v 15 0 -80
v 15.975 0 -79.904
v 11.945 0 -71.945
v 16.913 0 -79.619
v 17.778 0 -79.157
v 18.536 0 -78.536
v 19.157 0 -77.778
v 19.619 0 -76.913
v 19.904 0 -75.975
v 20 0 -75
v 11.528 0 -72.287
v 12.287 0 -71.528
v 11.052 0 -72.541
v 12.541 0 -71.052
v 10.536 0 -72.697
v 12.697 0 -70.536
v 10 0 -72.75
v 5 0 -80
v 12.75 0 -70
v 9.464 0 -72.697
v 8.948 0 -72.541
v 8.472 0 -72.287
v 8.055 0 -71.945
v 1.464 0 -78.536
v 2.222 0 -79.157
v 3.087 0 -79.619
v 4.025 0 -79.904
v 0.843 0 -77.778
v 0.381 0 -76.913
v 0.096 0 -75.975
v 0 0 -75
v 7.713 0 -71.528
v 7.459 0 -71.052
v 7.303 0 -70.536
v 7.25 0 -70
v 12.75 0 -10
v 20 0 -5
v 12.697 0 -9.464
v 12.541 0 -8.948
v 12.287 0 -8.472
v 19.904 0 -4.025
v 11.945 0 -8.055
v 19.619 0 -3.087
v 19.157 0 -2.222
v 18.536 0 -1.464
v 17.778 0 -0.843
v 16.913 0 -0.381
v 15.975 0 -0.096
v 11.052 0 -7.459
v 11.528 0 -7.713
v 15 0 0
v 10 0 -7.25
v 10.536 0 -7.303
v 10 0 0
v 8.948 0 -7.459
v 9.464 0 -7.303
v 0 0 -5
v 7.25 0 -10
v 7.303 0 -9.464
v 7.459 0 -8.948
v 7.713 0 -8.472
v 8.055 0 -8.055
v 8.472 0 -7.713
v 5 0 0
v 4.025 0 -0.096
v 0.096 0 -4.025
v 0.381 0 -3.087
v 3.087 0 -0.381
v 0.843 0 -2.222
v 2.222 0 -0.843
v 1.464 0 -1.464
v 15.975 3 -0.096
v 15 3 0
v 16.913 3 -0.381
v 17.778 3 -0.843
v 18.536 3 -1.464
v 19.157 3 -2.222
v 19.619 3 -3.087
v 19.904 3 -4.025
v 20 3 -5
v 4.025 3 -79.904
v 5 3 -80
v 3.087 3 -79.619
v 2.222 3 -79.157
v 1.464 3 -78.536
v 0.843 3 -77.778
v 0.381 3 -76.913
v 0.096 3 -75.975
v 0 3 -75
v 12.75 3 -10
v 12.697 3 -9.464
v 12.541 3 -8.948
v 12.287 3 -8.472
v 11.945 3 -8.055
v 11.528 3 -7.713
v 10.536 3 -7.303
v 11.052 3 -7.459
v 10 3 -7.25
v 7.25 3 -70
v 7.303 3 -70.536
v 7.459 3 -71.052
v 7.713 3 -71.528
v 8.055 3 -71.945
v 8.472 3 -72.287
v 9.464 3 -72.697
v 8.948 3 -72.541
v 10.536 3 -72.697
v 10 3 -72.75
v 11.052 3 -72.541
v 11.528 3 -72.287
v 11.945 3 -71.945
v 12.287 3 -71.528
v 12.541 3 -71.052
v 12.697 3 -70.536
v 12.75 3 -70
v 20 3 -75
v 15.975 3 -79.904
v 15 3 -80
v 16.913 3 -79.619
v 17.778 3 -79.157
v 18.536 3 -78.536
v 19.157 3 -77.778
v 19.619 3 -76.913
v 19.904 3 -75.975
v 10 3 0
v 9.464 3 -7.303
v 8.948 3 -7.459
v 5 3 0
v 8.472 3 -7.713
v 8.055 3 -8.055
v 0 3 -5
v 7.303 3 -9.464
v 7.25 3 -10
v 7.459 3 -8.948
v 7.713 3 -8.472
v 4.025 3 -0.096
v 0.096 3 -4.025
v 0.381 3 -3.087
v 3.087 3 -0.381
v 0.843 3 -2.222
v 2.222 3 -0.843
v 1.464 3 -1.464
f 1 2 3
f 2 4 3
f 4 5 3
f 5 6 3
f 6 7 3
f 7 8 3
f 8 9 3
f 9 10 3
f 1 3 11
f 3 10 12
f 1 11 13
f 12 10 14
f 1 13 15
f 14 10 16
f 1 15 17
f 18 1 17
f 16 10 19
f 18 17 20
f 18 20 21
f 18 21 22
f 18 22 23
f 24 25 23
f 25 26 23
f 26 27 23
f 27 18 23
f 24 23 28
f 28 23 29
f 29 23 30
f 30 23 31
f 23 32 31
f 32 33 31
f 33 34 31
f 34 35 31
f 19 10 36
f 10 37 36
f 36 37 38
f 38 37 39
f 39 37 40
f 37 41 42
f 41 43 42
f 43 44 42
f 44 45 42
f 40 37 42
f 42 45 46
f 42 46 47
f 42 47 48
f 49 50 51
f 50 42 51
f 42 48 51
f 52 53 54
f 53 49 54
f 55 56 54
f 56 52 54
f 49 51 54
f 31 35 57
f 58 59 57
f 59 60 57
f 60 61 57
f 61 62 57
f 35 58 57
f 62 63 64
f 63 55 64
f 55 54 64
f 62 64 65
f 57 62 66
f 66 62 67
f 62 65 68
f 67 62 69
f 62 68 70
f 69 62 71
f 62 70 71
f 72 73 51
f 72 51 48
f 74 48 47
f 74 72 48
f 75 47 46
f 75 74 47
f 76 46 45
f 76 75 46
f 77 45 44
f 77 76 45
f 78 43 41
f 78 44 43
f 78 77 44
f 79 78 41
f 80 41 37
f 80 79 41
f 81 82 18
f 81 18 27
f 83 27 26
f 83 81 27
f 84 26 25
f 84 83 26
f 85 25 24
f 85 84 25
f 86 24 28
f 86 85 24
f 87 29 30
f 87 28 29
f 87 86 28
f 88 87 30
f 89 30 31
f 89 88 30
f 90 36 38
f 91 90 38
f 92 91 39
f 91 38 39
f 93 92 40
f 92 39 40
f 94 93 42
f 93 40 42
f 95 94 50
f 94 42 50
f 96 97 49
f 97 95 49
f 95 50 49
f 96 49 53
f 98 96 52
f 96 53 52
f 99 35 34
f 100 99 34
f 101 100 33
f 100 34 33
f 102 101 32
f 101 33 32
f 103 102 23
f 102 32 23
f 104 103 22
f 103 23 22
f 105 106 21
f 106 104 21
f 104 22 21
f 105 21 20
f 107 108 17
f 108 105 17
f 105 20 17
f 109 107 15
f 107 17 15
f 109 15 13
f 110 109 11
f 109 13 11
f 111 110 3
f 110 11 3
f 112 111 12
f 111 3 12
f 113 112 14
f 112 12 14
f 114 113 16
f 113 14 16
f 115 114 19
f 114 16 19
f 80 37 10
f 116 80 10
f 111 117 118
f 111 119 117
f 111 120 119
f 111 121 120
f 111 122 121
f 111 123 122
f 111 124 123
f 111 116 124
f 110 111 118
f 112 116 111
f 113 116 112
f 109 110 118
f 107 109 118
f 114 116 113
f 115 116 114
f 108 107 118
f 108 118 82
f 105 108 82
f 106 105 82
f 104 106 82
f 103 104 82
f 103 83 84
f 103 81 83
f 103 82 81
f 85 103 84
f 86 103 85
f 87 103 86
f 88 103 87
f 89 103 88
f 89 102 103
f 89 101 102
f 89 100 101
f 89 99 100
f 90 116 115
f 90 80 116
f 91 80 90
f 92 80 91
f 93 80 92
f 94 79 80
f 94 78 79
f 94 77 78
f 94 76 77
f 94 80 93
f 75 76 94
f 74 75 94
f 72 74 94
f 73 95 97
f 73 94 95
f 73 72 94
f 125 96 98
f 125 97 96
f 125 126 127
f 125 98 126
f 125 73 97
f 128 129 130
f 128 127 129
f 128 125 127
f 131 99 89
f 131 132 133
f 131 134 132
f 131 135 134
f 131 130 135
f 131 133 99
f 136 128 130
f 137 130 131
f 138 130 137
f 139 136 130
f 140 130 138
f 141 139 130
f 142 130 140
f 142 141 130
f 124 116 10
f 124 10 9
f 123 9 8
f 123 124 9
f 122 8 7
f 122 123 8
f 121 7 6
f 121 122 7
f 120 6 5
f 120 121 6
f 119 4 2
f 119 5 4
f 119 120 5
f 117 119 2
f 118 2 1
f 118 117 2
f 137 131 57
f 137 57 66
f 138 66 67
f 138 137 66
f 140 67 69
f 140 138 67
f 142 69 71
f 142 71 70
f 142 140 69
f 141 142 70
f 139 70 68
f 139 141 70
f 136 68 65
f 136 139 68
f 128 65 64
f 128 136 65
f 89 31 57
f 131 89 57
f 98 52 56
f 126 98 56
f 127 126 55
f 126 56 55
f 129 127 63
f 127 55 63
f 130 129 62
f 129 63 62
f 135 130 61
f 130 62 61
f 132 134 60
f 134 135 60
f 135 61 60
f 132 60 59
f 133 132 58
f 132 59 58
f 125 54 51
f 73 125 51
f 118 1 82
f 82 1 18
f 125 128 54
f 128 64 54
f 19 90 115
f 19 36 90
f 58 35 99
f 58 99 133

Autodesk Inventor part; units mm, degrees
ref_plane "YZ Plane" through (0, 0, 0) normal (1, 0, 0) x (0, 1, 0)
ref_plane "XZ Plane" through (0, 0, 0) normal (0, 1, 0) x (-1, 0, 0)
ref_plane "XY Plane" through (0, 0, 0) normal (0, 0, 1) x (1, 0, 0)
sketch "Sketch1" plane through (0, 0, 0) normal (0, 1, 0) x (-1, 0, 0)
  line L0 (0, 0) -> (-20, 0)
  line L1 (-20, 0) -> (-20, -80)
  line L2 (-20, -80) -> (0, -80)
  line L3 (0, -80) -> (0, 0)
  line L4 (-10, 0) -> (-10, -10)
  line L5 (-10, -10) -> (-10, -70) construction
  line L6 (-12.75, -10) -> (-12.75, -70)
  line L7 (-7.25, -70) -> (-7.25, -10)
  arc A0 (-7.25, -10) -> (-12.75, -10) centre (-10, -10) ccw
  arc A1 (-12.75, -70) -> (-7.25, -70) centre (-10, -70) ccw
  line L8 (-10, -10) -> (50, -10) construction
  point P0 (-10, -40)
  dimension "d0" = 20
  dimension "d1" = 80
  dimension "d2" = 10
  dimension "d3" = 60
  dimension "d4" = 90
  dimension "d5" = 5.5
extrude "Extrusion1" add sketch "Sketch1" along normal blind 3
fillet "Fillet1" radius 5 4 edges at (20, 1.5, 0) (0, 1.5, 0) (20, 1.5, -80) (0, 1.5, -80)
properties part number "Carriage_Horizontal_Spacer"
